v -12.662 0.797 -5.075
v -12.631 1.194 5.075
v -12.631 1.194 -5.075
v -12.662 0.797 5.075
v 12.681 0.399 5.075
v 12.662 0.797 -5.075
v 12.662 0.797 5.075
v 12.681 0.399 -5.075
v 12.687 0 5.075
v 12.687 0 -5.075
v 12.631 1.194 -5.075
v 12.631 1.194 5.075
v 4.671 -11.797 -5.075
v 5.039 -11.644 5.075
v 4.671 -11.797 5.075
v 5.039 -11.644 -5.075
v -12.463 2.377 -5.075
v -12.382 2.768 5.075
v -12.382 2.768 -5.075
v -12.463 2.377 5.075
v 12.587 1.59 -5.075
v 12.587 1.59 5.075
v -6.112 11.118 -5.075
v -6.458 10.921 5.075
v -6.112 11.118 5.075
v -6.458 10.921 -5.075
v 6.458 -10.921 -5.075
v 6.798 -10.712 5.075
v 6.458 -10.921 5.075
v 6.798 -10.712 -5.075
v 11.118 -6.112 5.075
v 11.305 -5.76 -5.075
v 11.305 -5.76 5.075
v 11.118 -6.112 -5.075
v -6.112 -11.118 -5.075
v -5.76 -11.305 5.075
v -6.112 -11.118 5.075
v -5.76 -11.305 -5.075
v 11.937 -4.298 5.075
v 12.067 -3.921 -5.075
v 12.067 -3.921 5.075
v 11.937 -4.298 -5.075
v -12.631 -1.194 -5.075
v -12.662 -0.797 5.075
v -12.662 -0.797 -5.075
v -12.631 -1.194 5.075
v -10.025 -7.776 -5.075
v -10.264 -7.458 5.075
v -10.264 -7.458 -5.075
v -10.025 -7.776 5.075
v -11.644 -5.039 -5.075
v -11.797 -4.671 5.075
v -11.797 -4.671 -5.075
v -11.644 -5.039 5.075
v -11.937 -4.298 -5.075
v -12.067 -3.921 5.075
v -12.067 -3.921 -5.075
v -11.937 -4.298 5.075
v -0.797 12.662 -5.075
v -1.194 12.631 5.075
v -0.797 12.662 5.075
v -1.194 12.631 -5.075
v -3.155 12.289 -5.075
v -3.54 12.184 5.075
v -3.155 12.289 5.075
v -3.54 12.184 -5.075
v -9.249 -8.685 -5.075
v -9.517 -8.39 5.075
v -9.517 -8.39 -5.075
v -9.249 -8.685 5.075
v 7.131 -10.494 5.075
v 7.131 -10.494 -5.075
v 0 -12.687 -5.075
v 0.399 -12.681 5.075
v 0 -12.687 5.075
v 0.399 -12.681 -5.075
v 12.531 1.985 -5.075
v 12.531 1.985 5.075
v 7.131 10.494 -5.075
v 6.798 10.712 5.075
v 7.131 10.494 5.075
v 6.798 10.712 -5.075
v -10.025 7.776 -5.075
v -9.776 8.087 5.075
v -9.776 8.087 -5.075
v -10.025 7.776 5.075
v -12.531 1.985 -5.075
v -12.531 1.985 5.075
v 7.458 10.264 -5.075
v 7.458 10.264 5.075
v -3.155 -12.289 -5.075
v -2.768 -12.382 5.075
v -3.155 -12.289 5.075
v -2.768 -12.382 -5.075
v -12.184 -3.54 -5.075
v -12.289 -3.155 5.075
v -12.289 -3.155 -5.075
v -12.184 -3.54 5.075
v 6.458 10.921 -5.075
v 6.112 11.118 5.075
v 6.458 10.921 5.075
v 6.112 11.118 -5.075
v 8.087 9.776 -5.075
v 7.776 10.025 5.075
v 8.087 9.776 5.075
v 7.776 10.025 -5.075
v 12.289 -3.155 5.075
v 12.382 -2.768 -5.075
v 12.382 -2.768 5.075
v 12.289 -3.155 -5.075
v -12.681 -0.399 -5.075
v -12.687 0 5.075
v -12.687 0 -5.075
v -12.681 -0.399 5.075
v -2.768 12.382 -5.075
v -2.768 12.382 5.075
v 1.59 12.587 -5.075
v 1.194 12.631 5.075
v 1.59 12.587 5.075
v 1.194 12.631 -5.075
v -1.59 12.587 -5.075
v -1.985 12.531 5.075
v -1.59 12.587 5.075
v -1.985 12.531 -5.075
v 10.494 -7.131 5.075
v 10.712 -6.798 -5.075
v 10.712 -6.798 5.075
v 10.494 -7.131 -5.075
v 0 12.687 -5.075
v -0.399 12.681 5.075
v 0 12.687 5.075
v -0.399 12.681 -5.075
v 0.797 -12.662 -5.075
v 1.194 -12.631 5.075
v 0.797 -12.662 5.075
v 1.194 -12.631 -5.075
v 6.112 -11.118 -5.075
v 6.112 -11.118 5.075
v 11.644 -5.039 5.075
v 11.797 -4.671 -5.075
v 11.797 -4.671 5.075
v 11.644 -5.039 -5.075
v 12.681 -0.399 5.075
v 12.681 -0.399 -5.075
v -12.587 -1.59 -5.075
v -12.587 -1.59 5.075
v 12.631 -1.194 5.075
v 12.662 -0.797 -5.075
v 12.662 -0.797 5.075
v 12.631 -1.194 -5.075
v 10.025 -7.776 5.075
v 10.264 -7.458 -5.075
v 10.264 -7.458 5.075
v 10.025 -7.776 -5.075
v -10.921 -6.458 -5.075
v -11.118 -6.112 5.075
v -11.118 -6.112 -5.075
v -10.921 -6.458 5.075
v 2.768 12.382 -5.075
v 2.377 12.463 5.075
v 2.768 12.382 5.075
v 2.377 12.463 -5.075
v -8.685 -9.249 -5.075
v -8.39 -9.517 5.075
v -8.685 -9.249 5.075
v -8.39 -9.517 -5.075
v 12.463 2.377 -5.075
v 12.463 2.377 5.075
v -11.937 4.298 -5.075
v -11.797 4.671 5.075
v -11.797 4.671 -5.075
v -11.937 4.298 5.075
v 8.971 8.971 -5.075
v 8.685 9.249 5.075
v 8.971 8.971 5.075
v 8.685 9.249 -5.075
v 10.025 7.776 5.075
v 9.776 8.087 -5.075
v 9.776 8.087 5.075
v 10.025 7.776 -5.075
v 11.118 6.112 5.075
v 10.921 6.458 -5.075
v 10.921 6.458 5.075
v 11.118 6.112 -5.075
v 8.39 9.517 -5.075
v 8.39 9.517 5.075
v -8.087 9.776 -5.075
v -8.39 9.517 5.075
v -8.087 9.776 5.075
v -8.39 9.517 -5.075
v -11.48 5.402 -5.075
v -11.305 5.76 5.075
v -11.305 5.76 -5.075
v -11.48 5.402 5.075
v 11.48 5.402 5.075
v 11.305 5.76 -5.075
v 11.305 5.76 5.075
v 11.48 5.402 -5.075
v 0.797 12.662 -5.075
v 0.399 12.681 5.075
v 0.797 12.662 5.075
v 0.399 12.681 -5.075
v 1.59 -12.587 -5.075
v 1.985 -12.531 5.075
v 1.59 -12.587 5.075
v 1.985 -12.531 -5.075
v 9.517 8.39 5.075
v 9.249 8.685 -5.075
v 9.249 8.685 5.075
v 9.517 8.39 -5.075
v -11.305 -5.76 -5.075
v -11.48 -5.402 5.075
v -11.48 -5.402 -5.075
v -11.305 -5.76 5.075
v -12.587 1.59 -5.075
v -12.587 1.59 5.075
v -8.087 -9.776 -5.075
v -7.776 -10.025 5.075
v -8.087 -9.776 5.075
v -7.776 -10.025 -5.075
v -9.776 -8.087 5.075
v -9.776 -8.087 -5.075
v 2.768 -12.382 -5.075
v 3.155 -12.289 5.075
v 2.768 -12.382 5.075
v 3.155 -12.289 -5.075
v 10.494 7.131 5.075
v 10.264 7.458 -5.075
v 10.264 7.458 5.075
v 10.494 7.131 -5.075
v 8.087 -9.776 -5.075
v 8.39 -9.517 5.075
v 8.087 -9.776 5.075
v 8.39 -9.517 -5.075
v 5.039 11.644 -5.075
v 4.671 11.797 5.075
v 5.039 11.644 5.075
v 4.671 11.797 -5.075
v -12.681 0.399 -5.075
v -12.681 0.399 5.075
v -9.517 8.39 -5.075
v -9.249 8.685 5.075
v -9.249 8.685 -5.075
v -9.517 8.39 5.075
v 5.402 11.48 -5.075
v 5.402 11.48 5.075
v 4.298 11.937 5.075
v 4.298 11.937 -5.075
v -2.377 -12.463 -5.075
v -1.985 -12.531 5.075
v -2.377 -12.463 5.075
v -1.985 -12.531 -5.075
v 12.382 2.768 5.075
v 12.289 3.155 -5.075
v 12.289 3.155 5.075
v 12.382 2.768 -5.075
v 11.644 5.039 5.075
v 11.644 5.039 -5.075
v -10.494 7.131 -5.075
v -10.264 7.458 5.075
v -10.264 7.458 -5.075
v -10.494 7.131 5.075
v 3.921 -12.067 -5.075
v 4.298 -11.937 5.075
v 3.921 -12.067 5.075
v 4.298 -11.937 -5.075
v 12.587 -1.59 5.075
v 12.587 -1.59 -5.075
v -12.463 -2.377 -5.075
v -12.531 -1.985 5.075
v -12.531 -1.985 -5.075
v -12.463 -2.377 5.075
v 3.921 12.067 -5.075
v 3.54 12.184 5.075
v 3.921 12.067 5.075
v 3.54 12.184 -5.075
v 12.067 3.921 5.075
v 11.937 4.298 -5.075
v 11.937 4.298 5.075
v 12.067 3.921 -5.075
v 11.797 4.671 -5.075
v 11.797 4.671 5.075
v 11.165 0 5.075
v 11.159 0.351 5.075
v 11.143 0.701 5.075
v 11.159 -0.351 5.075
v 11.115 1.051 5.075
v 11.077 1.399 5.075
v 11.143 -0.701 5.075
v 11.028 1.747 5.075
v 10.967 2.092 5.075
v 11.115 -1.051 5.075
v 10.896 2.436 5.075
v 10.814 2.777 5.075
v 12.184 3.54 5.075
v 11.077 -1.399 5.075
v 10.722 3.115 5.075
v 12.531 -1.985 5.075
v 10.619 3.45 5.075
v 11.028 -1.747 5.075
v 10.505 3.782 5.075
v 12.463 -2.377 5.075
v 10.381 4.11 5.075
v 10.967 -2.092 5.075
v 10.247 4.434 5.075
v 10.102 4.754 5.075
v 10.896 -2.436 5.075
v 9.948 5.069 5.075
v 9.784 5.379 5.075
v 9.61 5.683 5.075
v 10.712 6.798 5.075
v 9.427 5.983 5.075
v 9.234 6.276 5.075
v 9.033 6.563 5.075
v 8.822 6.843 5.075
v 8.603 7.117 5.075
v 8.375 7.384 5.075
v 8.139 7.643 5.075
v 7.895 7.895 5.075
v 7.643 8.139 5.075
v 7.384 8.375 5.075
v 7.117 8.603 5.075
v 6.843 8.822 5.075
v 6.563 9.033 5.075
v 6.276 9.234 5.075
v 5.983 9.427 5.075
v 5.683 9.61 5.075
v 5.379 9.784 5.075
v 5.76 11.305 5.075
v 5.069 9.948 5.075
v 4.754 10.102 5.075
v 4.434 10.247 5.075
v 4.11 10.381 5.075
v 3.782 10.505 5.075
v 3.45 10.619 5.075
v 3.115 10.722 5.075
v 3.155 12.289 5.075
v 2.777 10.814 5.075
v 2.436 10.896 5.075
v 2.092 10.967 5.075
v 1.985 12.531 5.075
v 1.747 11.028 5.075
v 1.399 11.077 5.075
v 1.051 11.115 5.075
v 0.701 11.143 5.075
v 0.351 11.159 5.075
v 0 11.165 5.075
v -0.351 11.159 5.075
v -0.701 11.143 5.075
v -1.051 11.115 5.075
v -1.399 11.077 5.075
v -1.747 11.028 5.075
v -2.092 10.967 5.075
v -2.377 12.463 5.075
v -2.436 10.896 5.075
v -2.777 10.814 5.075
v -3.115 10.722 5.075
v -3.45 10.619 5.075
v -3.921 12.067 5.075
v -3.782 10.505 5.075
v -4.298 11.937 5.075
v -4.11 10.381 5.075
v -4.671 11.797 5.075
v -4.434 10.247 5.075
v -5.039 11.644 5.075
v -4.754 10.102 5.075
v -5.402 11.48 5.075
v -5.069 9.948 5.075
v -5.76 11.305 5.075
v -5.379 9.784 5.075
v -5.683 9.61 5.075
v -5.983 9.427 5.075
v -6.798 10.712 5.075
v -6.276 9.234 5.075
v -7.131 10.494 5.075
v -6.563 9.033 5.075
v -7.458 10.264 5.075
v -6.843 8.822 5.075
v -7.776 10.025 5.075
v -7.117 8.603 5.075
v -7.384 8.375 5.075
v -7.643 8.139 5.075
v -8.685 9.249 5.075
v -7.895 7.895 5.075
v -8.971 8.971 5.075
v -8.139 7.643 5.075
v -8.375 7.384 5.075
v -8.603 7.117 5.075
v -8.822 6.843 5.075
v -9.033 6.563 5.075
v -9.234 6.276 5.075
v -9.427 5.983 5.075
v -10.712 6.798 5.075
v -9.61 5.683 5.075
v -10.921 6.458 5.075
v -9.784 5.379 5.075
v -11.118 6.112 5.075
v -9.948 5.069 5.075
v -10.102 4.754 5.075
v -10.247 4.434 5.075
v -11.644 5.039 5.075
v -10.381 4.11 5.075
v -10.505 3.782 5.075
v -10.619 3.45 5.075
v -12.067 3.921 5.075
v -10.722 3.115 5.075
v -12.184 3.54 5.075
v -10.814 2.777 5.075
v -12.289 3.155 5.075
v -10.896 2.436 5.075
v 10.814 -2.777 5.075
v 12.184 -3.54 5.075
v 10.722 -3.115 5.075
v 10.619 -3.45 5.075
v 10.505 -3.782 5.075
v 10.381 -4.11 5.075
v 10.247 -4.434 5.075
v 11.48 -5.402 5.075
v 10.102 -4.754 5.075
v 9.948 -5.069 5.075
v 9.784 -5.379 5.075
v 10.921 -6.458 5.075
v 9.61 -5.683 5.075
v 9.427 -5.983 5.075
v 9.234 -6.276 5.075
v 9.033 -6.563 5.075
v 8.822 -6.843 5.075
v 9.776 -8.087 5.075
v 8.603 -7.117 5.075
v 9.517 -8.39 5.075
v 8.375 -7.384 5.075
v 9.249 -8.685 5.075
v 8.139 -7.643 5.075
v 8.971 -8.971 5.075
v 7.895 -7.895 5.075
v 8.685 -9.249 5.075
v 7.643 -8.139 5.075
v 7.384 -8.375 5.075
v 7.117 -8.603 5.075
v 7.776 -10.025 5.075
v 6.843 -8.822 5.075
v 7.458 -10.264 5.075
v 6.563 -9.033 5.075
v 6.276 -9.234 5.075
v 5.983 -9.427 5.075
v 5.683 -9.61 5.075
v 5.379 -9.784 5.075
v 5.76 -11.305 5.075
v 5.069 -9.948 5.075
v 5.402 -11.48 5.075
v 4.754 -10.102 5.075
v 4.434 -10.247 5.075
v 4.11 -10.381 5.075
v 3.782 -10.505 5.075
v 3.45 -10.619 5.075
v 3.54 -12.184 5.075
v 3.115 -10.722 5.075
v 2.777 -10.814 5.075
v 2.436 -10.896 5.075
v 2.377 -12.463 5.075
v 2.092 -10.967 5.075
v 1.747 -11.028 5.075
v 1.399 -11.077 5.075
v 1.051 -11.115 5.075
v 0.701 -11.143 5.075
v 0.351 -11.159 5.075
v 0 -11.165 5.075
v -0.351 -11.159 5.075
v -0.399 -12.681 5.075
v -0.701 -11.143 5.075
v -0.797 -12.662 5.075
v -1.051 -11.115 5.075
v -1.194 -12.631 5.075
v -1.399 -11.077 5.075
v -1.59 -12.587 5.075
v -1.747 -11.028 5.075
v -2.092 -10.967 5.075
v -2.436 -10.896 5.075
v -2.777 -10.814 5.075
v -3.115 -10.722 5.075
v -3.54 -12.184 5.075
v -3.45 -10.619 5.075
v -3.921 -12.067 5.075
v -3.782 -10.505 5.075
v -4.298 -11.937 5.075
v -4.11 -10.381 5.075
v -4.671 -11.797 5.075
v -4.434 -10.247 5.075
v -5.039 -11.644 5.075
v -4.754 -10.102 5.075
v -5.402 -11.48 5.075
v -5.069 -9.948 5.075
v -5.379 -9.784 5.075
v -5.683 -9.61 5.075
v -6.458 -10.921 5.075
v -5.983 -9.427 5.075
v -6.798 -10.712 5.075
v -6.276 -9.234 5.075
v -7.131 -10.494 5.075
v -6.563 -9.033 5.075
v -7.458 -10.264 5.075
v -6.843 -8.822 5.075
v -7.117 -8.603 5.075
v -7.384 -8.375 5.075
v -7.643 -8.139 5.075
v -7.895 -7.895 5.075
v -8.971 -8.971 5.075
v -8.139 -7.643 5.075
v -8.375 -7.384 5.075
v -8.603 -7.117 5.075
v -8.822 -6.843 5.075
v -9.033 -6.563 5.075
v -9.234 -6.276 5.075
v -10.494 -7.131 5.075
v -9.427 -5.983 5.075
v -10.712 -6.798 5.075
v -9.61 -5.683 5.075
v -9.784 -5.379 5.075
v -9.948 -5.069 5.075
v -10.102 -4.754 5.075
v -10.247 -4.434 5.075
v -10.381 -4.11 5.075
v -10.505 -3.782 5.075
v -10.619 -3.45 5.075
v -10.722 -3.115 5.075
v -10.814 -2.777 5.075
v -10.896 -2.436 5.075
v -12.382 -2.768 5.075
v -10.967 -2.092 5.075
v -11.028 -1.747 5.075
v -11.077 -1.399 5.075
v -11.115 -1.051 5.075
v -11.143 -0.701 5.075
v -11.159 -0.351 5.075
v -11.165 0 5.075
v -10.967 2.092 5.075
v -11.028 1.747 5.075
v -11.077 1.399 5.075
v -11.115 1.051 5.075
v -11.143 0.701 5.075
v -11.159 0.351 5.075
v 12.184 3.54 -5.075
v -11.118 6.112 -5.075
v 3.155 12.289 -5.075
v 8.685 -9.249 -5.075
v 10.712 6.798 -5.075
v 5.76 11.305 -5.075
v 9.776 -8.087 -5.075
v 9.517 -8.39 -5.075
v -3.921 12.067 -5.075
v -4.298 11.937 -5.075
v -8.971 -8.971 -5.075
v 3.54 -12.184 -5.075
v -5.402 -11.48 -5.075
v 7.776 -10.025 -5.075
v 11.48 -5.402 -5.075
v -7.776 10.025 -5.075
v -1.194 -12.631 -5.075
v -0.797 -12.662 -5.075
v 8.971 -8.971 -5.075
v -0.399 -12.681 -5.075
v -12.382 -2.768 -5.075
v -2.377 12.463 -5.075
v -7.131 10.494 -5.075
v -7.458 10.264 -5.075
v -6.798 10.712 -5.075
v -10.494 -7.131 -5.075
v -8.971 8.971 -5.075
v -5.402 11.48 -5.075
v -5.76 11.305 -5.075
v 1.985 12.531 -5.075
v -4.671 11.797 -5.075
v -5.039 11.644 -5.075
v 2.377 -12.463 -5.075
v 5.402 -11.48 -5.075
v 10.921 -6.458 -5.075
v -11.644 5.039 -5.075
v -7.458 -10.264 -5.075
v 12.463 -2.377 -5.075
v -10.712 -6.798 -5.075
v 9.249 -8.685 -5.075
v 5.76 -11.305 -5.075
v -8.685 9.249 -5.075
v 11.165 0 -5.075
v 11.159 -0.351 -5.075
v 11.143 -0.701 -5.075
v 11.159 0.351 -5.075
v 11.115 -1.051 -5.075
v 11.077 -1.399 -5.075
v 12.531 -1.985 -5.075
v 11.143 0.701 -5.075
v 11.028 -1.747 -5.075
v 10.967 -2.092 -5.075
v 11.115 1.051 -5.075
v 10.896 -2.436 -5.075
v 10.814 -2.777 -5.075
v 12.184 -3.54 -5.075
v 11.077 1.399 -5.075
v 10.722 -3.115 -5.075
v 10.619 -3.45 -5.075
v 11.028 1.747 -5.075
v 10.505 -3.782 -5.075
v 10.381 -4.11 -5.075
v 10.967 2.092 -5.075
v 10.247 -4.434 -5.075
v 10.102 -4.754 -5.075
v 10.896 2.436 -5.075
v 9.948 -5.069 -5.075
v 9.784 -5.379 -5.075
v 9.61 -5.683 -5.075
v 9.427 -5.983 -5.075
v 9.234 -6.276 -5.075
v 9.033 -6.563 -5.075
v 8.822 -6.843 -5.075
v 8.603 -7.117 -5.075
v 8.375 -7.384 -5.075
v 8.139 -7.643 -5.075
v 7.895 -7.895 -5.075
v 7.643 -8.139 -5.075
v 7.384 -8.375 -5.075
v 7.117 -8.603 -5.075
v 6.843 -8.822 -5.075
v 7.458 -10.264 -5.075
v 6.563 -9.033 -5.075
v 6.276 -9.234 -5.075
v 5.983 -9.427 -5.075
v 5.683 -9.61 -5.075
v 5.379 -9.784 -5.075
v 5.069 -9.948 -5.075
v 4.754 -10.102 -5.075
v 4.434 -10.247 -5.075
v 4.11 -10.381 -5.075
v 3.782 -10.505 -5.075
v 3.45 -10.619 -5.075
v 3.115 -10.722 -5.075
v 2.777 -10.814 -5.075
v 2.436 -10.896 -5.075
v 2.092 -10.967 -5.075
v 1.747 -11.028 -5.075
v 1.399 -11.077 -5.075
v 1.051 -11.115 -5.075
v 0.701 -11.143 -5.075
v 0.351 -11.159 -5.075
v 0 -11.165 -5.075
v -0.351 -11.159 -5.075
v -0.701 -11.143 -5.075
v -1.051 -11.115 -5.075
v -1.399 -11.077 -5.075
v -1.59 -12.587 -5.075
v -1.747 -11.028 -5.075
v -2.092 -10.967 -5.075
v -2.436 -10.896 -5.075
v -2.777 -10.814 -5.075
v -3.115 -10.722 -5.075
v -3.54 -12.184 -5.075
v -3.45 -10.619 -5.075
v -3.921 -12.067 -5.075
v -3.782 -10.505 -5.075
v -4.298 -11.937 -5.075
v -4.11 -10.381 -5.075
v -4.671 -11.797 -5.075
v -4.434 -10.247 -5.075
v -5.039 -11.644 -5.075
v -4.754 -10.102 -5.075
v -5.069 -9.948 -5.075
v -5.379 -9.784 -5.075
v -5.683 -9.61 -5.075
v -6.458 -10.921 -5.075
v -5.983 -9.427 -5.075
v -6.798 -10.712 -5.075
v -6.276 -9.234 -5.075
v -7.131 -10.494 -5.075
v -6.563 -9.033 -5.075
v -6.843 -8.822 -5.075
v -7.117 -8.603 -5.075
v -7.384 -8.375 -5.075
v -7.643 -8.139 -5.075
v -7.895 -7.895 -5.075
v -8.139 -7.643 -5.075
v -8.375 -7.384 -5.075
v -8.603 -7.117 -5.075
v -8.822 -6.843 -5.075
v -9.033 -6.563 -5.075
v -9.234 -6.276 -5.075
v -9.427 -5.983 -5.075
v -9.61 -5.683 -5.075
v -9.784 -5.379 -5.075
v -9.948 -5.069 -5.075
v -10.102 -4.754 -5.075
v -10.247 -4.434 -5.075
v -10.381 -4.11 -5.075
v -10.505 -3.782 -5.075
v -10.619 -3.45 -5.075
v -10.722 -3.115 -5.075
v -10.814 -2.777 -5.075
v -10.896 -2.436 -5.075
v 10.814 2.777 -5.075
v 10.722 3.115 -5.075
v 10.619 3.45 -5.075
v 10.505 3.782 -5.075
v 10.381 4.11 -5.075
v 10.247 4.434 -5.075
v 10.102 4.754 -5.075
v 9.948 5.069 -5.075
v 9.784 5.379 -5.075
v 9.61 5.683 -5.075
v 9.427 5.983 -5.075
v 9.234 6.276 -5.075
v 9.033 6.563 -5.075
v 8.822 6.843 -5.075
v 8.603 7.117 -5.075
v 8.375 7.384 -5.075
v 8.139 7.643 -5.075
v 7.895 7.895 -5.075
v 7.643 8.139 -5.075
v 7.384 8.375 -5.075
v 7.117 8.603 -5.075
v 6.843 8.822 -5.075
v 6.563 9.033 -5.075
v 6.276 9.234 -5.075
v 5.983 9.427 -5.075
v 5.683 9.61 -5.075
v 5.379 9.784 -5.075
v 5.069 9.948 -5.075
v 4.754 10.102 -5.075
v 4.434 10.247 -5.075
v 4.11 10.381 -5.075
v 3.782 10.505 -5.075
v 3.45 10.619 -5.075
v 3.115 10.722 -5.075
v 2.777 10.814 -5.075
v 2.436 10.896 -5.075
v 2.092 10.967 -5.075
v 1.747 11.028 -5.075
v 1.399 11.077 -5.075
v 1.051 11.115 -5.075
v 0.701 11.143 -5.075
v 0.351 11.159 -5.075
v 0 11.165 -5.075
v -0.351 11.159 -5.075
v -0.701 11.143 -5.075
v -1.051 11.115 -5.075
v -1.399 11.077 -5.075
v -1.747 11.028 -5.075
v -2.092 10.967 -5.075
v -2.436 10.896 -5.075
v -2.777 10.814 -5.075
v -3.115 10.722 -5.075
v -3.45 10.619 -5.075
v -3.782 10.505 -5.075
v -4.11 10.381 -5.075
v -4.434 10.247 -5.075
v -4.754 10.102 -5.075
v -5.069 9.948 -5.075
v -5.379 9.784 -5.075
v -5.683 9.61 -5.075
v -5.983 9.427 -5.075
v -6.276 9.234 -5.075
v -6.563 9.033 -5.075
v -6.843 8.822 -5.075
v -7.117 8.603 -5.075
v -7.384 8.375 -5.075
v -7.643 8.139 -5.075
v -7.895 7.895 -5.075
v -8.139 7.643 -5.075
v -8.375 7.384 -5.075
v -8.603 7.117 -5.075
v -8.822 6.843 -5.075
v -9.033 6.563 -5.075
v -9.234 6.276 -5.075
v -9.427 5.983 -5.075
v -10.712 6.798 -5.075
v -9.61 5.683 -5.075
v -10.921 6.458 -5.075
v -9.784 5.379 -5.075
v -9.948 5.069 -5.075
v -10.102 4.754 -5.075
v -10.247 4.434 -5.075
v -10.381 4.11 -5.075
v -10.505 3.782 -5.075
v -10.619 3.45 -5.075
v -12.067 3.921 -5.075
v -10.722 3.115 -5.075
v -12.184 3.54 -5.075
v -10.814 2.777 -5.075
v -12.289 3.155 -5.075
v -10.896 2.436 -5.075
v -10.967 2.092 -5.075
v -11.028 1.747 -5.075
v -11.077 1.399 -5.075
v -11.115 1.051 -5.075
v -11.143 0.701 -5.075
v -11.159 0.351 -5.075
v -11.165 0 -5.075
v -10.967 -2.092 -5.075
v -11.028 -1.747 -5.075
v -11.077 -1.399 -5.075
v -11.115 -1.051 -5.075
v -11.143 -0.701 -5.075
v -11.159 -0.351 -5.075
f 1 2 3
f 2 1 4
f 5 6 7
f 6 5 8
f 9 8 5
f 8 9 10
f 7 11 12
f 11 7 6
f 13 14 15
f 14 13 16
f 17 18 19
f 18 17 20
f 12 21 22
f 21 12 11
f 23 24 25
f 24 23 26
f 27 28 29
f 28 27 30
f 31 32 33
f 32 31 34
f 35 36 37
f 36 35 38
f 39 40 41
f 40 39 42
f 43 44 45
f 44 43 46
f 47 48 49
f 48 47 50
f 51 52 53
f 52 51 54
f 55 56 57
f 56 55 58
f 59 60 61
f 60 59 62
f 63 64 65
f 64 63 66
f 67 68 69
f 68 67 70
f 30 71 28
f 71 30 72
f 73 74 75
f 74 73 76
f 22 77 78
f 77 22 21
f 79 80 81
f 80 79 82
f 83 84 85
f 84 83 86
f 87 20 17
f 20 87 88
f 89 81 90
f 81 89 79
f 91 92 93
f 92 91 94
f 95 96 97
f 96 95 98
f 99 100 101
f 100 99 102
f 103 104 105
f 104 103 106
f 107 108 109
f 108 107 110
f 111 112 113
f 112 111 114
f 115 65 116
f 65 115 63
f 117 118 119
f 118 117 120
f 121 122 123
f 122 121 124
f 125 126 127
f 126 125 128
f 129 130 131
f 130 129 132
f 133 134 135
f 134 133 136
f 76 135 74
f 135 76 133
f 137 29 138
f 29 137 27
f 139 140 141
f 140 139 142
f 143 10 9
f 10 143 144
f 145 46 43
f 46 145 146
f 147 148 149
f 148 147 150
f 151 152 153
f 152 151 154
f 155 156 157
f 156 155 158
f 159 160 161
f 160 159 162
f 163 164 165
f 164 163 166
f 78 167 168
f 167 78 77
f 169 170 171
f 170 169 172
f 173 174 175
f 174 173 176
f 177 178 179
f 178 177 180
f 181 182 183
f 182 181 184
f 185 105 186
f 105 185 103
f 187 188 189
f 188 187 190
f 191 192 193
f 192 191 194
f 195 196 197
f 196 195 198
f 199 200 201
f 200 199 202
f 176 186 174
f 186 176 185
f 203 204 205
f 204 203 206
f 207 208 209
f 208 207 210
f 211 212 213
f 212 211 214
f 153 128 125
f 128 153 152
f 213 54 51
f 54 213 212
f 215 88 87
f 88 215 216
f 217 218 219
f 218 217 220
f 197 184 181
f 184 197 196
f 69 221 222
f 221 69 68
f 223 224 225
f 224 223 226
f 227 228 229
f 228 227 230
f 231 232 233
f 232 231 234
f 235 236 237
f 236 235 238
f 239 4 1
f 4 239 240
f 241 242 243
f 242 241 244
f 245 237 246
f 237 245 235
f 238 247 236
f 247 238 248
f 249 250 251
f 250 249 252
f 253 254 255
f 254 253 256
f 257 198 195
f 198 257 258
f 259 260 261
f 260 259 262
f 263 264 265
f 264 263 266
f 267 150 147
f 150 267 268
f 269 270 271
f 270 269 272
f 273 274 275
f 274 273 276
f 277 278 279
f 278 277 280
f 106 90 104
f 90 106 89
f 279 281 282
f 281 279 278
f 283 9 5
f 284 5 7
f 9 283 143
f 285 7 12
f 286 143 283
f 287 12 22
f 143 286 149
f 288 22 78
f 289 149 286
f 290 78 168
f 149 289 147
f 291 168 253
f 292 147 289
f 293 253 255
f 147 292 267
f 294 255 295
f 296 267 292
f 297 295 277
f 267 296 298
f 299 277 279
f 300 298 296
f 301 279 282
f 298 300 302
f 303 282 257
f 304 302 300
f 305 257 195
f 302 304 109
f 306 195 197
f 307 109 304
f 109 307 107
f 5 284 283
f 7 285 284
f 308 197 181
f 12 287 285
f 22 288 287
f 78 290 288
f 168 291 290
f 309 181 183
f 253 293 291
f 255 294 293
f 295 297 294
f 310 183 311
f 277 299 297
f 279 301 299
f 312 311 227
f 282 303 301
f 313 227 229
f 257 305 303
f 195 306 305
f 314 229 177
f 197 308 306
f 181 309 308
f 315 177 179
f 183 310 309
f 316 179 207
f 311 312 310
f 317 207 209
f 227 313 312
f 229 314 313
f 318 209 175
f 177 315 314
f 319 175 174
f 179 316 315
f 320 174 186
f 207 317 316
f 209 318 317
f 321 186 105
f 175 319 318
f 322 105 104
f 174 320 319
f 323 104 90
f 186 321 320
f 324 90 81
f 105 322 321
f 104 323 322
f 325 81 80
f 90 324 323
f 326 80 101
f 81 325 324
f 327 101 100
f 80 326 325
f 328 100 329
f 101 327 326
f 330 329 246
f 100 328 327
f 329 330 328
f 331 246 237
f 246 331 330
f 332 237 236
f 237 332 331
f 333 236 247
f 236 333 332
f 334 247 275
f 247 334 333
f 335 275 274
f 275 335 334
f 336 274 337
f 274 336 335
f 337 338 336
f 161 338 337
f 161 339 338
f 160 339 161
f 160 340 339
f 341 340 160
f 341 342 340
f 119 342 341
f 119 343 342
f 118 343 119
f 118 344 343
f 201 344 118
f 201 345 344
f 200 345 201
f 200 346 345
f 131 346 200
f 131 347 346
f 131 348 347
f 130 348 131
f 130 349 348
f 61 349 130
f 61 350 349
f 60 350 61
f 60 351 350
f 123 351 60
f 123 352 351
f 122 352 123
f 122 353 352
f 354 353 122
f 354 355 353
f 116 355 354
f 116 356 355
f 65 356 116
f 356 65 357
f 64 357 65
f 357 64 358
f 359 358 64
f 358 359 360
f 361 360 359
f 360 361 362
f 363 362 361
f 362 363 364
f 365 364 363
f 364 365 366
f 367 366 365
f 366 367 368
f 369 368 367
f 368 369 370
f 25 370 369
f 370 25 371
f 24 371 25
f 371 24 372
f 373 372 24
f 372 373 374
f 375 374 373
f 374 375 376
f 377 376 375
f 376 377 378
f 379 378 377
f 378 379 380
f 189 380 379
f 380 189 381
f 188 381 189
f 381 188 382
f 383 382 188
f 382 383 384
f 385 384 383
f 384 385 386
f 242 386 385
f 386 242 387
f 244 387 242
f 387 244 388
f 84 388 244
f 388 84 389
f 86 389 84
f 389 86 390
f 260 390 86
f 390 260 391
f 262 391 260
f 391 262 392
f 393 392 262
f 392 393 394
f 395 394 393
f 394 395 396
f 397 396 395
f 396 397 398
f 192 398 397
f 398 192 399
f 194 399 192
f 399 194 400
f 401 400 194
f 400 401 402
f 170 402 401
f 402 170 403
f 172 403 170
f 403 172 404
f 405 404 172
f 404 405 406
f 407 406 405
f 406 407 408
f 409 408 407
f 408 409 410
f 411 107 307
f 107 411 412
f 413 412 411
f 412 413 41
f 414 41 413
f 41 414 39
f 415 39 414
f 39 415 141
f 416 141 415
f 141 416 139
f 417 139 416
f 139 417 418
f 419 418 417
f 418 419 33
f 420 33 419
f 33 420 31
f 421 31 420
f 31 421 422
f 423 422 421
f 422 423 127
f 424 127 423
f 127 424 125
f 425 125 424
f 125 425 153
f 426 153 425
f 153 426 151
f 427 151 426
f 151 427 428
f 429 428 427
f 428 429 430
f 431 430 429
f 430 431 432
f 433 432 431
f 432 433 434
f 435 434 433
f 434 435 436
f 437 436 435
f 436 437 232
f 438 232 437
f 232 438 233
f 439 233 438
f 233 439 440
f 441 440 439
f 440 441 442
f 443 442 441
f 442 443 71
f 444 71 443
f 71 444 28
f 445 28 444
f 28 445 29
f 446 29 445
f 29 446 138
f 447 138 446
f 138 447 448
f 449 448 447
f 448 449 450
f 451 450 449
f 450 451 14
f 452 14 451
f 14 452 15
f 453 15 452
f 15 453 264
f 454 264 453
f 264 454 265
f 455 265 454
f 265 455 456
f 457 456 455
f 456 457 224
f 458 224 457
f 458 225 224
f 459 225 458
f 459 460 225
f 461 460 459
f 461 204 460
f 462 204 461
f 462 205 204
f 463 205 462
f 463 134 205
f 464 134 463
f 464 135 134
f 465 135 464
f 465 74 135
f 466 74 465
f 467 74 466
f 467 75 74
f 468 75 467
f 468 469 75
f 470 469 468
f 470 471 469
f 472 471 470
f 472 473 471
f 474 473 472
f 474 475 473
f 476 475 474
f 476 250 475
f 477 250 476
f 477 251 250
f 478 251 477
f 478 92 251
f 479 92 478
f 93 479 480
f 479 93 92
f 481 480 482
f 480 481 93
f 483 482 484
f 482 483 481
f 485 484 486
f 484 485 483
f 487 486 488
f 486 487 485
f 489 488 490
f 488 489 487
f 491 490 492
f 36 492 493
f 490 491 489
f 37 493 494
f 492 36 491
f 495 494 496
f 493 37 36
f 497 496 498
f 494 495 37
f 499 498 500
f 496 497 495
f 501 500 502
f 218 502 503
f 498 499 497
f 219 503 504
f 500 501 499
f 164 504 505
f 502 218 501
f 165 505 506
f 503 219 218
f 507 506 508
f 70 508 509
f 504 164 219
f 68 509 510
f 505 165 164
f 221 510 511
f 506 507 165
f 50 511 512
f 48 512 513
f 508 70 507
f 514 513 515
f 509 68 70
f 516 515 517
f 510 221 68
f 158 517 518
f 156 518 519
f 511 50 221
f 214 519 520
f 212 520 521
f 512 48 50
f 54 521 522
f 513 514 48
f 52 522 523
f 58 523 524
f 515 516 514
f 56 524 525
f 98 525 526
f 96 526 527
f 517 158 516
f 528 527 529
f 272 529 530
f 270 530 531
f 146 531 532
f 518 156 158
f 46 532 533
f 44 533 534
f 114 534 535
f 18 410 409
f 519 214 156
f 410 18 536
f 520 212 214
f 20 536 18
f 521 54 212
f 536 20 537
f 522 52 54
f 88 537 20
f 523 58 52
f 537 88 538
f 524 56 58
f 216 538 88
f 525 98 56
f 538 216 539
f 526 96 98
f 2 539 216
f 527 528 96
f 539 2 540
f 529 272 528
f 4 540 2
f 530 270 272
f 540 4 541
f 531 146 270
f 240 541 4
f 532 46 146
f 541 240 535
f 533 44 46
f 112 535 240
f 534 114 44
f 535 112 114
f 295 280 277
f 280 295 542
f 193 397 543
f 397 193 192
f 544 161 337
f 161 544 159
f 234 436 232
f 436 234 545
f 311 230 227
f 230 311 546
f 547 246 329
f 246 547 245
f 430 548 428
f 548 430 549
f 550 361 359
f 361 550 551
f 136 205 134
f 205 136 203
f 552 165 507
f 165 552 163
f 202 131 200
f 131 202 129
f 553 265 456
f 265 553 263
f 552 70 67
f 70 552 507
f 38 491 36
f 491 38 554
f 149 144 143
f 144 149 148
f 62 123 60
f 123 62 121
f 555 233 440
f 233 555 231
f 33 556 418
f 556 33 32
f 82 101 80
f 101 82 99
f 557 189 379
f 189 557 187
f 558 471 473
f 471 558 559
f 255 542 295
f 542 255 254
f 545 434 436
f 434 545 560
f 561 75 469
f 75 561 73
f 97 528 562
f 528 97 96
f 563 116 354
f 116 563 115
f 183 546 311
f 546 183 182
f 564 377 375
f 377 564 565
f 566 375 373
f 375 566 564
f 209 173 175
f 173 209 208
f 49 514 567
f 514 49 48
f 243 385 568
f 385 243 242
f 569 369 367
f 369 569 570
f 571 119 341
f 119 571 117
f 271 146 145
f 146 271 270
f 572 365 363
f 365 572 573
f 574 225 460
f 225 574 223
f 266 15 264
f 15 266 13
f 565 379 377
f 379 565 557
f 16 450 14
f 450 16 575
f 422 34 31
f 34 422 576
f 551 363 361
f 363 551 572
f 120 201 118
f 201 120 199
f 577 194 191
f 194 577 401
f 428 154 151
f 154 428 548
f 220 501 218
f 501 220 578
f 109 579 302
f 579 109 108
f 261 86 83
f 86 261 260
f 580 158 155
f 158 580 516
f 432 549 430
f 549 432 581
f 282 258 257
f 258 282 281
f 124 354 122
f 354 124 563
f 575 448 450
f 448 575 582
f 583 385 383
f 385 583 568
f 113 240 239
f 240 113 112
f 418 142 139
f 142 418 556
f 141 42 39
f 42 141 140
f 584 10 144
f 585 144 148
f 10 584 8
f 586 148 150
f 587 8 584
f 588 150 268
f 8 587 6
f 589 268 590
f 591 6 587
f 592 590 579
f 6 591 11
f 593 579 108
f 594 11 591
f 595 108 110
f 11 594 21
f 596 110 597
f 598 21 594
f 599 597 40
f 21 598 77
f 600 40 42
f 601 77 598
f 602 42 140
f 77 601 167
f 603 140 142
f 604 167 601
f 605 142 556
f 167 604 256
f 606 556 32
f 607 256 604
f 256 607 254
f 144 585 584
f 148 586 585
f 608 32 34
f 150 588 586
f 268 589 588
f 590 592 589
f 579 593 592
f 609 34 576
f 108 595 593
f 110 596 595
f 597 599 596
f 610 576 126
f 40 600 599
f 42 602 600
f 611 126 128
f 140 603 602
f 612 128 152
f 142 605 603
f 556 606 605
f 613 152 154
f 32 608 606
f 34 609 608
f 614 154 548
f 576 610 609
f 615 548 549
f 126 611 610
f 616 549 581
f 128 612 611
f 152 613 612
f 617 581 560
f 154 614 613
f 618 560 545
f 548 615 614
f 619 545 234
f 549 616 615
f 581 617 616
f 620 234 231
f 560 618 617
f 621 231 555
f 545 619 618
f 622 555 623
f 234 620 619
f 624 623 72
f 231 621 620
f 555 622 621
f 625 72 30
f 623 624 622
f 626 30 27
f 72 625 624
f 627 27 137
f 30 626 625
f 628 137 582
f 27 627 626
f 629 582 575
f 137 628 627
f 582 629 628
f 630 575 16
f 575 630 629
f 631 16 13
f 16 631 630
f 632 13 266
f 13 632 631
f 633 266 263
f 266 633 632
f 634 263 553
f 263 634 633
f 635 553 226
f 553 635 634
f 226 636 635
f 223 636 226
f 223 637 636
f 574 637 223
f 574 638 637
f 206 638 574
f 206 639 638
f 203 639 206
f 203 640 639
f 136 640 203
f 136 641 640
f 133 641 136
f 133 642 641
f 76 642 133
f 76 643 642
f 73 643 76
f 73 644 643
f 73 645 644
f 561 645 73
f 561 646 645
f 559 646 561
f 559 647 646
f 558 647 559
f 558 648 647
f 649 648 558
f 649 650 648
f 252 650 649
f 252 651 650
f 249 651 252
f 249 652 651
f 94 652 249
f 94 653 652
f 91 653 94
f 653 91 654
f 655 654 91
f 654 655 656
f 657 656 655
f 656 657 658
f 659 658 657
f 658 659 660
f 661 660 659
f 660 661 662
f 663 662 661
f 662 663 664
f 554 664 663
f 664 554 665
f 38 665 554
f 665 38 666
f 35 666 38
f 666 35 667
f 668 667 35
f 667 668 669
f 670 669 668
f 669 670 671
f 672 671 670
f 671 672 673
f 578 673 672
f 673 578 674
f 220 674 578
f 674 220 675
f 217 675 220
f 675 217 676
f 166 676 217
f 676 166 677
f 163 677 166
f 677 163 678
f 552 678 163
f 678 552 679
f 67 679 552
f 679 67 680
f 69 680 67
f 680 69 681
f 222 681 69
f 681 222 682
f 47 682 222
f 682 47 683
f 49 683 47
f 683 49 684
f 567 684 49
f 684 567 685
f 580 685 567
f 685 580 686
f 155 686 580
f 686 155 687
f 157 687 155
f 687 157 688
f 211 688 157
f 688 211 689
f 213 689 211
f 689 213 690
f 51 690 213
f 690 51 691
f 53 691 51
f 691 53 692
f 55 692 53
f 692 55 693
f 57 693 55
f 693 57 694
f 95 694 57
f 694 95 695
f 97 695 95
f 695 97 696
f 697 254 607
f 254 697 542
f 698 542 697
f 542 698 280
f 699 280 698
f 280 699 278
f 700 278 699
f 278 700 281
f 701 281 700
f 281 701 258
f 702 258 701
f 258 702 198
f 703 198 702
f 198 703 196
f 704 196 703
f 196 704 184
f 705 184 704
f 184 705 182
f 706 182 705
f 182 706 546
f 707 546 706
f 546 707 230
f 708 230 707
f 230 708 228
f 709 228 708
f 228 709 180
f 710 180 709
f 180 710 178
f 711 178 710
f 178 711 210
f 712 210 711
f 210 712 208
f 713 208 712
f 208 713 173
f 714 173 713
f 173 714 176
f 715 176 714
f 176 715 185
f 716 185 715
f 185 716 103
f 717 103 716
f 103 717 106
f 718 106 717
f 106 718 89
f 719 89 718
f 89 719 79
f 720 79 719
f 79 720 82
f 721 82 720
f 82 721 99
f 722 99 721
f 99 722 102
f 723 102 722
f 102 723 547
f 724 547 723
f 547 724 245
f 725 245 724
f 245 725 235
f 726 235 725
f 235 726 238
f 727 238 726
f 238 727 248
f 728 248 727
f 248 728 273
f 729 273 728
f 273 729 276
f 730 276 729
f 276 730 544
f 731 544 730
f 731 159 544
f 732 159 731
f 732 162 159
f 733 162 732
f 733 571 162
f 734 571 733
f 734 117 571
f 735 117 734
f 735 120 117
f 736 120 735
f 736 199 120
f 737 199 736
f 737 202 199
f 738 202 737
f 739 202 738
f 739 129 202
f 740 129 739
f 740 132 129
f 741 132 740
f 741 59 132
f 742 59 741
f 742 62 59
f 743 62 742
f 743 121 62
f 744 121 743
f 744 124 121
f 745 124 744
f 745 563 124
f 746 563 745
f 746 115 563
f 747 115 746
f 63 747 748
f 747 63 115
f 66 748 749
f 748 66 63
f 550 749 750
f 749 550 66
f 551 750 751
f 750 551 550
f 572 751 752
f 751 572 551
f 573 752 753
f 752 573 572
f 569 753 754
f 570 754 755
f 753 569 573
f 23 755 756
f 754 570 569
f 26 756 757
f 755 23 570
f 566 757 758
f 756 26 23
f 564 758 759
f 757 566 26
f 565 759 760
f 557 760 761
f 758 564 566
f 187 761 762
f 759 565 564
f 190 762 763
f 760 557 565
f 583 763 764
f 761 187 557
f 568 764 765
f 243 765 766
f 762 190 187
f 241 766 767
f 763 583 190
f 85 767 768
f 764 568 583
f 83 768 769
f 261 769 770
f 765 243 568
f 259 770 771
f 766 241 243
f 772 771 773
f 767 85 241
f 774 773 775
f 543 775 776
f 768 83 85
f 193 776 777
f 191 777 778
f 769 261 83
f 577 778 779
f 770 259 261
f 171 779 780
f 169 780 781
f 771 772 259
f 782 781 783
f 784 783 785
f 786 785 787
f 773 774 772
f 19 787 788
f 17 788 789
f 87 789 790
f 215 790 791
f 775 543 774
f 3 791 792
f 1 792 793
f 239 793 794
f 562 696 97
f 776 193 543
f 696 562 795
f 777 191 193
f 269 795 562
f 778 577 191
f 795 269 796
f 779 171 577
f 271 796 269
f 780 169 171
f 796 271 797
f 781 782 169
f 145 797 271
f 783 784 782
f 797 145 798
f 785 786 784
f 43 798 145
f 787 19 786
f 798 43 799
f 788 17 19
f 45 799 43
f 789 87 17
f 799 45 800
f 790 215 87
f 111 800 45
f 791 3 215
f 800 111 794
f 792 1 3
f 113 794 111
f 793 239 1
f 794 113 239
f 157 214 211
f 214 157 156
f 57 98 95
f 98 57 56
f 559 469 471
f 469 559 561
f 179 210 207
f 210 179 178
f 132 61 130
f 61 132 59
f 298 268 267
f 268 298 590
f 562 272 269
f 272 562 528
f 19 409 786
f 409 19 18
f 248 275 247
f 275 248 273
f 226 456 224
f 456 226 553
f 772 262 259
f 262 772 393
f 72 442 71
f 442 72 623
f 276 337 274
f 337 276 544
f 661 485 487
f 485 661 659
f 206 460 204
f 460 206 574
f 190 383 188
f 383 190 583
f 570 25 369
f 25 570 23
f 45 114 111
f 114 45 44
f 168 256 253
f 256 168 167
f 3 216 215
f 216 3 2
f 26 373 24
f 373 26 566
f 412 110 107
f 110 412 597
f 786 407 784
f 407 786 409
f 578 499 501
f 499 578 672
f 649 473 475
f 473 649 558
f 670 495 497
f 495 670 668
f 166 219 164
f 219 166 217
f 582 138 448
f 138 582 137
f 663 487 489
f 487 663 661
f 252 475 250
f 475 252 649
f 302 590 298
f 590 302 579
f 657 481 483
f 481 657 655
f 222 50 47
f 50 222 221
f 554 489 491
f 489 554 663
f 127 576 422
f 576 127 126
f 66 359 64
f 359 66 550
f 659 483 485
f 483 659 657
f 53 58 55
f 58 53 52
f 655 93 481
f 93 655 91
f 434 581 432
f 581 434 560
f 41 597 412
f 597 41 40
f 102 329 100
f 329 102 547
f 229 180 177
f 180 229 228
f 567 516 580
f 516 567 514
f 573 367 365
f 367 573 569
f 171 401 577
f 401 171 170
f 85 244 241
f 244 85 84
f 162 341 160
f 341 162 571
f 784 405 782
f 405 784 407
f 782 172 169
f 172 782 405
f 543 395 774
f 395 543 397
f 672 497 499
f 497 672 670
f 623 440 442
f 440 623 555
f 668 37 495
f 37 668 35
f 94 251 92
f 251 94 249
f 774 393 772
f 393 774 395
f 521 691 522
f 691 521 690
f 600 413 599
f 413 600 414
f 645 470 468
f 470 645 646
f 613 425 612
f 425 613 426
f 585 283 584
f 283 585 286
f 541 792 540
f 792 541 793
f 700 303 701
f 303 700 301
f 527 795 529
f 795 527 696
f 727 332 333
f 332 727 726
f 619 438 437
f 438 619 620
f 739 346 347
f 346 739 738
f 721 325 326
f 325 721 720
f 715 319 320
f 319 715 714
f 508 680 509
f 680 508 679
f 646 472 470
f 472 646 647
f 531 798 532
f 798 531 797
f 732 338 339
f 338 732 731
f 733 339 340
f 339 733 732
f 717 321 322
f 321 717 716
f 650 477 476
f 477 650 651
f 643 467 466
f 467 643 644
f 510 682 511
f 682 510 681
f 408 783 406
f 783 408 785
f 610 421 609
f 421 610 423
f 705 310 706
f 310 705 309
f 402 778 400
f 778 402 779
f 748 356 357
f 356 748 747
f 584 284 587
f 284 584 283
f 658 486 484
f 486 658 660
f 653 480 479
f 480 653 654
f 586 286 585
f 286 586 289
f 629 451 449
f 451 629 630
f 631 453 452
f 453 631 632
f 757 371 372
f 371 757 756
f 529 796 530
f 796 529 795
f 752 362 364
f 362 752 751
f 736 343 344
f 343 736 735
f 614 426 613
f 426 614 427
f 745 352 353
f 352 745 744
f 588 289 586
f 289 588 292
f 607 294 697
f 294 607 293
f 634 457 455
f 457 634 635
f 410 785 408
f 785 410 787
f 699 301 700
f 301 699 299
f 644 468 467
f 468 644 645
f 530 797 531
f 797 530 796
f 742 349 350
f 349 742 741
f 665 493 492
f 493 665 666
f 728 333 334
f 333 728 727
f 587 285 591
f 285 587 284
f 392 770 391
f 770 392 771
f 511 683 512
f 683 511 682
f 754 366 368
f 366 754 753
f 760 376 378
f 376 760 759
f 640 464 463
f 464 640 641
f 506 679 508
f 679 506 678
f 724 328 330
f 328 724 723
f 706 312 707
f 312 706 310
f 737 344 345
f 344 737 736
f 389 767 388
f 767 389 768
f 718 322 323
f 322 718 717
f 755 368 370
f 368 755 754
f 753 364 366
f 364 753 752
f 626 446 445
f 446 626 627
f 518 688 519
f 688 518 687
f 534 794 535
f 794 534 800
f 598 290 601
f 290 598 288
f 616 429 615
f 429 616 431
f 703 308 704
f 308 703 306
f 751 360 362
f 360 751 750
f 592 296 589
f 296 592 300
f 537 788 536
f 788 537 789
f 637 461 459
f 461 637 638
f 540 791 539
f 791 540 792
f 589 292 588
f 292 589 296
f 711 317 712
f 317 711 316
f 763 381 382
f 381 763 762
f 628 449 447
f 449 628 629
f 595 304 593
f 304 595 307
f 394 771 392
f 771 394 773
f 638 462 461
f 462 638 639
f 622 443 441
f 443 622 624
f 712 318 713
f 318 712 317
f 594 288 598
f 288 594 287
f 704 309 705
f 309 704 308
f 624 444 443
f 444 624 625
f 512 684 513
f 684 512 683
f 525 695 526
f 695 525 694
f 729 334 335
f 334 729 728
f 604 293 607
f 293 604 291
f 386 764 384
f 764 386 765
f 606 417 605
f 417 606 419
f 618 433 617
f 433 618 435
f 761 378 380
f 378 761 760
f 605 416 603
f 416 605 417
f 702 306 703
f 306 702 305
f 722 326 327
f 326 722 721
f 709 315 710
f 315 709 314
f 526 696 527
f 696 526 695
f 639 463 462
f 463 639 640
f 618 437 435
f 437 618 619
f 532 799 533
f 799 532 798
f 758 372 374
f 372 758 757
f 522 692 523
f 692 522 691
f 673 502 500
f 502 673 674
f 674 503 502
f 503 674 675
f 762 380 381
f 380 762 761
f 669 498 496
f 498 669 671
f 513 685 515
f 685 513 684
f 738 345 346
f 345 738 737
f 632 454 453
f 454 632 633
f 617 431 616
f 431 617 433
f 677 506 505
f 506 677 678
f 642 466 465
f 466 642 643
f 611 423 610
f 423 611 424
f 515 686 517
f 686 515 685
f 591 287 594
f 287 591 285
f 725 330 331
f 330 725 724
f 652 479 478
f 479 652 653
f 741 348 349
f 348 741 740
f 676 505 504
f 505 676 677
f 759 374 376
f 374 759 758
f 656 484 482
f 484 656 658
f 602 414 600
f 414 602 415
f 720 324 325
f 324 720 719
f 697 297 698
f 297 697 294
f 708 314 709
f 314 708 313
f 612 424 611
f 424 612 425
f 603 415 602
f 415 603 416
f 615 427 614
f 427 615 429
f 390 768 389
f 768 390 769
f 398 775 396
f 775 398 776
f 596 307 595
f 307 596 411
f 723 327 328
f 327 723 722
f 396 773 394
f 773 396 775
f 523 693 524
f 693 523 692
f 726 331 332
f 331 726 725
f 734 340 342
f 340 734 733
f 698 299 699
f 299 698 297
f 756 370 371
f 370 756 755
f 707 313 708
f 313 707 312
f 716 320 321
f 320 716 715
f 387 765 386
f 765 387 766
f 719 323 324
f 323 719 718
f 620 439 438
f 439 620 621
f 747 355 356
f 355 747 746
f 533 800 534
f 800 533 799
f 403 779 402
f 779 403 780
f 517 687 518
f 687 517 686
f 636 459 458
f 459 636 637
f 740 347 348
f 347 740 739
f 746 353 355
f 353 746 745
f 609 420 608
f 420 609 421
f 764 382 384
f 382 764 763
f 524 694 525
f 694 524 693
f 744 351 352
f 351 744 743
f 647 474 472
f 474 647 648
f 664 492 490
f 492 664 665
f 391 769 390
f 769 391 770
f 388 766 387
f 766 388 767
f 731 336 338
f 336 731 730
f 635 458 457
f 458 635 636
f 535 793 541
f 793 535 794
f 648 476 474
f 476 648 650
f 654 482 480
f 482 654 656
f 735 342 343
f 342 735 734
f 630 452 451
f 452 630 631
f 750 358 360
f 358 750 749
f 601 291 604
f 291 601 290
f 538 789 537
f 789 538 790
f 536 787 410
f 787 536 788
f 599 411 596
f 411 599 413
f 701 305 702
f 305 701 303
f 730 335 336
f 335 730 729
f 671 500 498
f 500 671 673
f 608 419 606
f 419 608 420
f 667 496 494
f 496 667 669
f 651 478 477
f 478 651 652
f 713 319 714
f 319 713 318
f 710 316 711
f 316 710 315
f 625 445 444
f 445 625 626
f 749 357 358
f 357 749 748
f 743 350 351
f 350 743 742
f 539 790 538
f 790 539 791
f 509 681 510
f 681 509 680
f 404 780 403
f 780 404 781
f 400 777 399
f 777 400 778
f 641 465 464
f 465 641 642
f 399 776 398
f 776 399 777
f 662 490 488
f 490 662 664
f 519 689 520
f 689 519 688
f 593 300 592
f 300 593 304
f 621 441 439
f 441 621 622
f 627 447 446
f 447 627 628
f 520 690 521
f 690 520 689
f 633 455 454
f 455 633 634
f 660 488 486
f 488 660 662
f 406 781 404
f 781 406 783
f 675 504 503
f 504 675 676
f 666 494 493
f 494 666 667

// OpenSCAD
$fn=200;
f = 1.015;
difference() {
cylinder(h=f*10, d=f*25, center=true);
cylinder(h=f*10, d=f*22, center=true);
}
